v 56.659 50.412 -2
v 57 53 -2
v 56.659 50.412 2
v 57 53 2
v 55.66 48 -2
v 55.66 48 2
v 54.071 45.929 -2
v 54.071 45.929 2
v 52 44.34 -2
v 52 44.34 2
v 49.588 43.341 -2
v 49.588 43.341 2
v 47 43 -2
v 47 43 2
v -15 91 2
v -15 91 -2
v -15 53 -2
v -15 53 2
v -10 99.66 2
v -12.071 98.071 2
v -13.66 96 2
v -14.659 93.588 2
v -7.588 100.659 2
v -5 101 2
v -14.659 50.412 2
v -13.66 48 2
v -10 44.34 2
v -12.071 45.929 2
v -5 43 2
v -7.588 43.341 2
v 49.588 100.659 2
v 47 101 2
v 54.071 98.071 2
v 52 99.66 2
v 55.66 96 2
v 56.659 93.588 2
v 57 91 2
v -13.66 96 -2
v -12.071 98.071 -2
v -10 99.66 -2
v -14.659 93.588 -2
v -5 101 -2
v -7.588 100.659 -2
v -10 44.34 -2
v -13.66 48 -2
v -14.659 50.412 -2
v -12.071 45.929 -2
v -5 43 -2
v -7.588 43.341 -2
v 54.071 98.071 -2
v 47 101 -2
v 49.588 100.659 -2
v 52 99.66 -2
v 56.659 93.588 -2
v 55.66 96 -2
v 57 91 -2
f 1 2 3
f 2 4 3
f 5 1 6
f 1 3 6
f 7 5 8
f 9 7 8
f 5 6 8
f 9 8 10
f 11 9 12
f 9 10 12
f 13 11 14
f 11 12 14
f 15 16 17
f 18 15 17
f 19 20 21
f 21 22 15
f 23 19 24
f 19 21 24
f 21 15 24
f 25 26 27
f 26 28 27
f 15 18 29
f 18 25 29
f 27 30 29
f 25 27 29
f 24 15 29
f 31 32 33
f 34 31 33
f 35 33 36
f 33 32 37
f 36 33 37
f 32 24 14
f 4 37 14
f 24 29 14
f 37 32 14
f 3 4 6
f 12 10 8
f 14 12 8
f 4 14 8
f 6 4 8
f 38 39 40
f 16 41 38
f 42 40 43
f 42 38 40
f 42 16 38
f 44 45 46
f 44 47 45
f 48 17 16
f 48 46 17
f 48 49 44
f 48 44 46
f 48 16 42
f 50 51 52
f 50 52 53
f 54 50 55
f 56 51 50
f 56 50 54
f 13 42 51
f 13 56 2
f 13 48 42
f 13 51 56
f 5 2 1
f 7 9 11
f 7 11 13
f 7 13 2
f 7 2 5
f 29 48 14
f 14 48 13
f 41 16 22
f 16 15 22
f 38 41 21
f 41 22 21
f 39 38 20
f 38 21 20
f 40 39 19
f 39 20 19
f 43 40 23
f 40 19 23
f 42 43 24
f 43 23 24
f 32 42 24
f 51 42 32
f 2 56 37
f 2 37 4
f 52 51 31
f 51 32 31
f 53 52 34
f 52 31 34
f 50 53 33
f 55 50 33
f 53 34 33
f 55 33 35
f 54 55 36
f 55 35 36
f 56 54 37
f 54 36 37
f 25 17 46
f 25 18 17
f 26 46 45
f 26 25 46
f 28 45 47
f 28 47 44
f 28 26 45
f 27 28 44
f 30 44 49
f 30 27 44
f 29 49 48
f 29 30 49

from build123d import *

# Parameters (mm, degrees)
BOX031_W     = 72
BOX031_H     = 58
BOX031_DEPTH = 4
FILLET025_R  = 10


with BuildPart() as fillet025:
    # Box031 → Box031 (new body)
    with BuildSketch(Plane(origin=(-15, -29, -2), x_dir=(1, 0, 0), z_dir=(0, 0, 1))):
        with Locations((36, 29)):
            Rectangle(BOX031_W, BOX031_H)
    extrude(amount=BOX031_DEPTH)

    # Fillet025
    fillet025_edges = [fillet025.edges().sort_by_distance(p)[0] for p in [
        (-15, -29, 0),
        (-15, 29, 0),
        (57, -29, 0),
        (57, 29, 0),
    ]]
    fillet(fillet025_edges, radius=FILLET025_R)


with BuildPart() as part_mirroring010:
    # Part__Mirroring010: instance of Fillet025
    add(fillet025.part.mirror(Plane(origin=(0, 0, 0), x_dir=(1, 0, 0), z_dir=(0, 1, 0))))


with BuildPart() as part_mirroring010_1:
    # Part__Mirroring010 placement: moved
    add(part_mirroring010.part.moved(Location((0, 72, 0))))


solid = part_mirroring010_1.part
